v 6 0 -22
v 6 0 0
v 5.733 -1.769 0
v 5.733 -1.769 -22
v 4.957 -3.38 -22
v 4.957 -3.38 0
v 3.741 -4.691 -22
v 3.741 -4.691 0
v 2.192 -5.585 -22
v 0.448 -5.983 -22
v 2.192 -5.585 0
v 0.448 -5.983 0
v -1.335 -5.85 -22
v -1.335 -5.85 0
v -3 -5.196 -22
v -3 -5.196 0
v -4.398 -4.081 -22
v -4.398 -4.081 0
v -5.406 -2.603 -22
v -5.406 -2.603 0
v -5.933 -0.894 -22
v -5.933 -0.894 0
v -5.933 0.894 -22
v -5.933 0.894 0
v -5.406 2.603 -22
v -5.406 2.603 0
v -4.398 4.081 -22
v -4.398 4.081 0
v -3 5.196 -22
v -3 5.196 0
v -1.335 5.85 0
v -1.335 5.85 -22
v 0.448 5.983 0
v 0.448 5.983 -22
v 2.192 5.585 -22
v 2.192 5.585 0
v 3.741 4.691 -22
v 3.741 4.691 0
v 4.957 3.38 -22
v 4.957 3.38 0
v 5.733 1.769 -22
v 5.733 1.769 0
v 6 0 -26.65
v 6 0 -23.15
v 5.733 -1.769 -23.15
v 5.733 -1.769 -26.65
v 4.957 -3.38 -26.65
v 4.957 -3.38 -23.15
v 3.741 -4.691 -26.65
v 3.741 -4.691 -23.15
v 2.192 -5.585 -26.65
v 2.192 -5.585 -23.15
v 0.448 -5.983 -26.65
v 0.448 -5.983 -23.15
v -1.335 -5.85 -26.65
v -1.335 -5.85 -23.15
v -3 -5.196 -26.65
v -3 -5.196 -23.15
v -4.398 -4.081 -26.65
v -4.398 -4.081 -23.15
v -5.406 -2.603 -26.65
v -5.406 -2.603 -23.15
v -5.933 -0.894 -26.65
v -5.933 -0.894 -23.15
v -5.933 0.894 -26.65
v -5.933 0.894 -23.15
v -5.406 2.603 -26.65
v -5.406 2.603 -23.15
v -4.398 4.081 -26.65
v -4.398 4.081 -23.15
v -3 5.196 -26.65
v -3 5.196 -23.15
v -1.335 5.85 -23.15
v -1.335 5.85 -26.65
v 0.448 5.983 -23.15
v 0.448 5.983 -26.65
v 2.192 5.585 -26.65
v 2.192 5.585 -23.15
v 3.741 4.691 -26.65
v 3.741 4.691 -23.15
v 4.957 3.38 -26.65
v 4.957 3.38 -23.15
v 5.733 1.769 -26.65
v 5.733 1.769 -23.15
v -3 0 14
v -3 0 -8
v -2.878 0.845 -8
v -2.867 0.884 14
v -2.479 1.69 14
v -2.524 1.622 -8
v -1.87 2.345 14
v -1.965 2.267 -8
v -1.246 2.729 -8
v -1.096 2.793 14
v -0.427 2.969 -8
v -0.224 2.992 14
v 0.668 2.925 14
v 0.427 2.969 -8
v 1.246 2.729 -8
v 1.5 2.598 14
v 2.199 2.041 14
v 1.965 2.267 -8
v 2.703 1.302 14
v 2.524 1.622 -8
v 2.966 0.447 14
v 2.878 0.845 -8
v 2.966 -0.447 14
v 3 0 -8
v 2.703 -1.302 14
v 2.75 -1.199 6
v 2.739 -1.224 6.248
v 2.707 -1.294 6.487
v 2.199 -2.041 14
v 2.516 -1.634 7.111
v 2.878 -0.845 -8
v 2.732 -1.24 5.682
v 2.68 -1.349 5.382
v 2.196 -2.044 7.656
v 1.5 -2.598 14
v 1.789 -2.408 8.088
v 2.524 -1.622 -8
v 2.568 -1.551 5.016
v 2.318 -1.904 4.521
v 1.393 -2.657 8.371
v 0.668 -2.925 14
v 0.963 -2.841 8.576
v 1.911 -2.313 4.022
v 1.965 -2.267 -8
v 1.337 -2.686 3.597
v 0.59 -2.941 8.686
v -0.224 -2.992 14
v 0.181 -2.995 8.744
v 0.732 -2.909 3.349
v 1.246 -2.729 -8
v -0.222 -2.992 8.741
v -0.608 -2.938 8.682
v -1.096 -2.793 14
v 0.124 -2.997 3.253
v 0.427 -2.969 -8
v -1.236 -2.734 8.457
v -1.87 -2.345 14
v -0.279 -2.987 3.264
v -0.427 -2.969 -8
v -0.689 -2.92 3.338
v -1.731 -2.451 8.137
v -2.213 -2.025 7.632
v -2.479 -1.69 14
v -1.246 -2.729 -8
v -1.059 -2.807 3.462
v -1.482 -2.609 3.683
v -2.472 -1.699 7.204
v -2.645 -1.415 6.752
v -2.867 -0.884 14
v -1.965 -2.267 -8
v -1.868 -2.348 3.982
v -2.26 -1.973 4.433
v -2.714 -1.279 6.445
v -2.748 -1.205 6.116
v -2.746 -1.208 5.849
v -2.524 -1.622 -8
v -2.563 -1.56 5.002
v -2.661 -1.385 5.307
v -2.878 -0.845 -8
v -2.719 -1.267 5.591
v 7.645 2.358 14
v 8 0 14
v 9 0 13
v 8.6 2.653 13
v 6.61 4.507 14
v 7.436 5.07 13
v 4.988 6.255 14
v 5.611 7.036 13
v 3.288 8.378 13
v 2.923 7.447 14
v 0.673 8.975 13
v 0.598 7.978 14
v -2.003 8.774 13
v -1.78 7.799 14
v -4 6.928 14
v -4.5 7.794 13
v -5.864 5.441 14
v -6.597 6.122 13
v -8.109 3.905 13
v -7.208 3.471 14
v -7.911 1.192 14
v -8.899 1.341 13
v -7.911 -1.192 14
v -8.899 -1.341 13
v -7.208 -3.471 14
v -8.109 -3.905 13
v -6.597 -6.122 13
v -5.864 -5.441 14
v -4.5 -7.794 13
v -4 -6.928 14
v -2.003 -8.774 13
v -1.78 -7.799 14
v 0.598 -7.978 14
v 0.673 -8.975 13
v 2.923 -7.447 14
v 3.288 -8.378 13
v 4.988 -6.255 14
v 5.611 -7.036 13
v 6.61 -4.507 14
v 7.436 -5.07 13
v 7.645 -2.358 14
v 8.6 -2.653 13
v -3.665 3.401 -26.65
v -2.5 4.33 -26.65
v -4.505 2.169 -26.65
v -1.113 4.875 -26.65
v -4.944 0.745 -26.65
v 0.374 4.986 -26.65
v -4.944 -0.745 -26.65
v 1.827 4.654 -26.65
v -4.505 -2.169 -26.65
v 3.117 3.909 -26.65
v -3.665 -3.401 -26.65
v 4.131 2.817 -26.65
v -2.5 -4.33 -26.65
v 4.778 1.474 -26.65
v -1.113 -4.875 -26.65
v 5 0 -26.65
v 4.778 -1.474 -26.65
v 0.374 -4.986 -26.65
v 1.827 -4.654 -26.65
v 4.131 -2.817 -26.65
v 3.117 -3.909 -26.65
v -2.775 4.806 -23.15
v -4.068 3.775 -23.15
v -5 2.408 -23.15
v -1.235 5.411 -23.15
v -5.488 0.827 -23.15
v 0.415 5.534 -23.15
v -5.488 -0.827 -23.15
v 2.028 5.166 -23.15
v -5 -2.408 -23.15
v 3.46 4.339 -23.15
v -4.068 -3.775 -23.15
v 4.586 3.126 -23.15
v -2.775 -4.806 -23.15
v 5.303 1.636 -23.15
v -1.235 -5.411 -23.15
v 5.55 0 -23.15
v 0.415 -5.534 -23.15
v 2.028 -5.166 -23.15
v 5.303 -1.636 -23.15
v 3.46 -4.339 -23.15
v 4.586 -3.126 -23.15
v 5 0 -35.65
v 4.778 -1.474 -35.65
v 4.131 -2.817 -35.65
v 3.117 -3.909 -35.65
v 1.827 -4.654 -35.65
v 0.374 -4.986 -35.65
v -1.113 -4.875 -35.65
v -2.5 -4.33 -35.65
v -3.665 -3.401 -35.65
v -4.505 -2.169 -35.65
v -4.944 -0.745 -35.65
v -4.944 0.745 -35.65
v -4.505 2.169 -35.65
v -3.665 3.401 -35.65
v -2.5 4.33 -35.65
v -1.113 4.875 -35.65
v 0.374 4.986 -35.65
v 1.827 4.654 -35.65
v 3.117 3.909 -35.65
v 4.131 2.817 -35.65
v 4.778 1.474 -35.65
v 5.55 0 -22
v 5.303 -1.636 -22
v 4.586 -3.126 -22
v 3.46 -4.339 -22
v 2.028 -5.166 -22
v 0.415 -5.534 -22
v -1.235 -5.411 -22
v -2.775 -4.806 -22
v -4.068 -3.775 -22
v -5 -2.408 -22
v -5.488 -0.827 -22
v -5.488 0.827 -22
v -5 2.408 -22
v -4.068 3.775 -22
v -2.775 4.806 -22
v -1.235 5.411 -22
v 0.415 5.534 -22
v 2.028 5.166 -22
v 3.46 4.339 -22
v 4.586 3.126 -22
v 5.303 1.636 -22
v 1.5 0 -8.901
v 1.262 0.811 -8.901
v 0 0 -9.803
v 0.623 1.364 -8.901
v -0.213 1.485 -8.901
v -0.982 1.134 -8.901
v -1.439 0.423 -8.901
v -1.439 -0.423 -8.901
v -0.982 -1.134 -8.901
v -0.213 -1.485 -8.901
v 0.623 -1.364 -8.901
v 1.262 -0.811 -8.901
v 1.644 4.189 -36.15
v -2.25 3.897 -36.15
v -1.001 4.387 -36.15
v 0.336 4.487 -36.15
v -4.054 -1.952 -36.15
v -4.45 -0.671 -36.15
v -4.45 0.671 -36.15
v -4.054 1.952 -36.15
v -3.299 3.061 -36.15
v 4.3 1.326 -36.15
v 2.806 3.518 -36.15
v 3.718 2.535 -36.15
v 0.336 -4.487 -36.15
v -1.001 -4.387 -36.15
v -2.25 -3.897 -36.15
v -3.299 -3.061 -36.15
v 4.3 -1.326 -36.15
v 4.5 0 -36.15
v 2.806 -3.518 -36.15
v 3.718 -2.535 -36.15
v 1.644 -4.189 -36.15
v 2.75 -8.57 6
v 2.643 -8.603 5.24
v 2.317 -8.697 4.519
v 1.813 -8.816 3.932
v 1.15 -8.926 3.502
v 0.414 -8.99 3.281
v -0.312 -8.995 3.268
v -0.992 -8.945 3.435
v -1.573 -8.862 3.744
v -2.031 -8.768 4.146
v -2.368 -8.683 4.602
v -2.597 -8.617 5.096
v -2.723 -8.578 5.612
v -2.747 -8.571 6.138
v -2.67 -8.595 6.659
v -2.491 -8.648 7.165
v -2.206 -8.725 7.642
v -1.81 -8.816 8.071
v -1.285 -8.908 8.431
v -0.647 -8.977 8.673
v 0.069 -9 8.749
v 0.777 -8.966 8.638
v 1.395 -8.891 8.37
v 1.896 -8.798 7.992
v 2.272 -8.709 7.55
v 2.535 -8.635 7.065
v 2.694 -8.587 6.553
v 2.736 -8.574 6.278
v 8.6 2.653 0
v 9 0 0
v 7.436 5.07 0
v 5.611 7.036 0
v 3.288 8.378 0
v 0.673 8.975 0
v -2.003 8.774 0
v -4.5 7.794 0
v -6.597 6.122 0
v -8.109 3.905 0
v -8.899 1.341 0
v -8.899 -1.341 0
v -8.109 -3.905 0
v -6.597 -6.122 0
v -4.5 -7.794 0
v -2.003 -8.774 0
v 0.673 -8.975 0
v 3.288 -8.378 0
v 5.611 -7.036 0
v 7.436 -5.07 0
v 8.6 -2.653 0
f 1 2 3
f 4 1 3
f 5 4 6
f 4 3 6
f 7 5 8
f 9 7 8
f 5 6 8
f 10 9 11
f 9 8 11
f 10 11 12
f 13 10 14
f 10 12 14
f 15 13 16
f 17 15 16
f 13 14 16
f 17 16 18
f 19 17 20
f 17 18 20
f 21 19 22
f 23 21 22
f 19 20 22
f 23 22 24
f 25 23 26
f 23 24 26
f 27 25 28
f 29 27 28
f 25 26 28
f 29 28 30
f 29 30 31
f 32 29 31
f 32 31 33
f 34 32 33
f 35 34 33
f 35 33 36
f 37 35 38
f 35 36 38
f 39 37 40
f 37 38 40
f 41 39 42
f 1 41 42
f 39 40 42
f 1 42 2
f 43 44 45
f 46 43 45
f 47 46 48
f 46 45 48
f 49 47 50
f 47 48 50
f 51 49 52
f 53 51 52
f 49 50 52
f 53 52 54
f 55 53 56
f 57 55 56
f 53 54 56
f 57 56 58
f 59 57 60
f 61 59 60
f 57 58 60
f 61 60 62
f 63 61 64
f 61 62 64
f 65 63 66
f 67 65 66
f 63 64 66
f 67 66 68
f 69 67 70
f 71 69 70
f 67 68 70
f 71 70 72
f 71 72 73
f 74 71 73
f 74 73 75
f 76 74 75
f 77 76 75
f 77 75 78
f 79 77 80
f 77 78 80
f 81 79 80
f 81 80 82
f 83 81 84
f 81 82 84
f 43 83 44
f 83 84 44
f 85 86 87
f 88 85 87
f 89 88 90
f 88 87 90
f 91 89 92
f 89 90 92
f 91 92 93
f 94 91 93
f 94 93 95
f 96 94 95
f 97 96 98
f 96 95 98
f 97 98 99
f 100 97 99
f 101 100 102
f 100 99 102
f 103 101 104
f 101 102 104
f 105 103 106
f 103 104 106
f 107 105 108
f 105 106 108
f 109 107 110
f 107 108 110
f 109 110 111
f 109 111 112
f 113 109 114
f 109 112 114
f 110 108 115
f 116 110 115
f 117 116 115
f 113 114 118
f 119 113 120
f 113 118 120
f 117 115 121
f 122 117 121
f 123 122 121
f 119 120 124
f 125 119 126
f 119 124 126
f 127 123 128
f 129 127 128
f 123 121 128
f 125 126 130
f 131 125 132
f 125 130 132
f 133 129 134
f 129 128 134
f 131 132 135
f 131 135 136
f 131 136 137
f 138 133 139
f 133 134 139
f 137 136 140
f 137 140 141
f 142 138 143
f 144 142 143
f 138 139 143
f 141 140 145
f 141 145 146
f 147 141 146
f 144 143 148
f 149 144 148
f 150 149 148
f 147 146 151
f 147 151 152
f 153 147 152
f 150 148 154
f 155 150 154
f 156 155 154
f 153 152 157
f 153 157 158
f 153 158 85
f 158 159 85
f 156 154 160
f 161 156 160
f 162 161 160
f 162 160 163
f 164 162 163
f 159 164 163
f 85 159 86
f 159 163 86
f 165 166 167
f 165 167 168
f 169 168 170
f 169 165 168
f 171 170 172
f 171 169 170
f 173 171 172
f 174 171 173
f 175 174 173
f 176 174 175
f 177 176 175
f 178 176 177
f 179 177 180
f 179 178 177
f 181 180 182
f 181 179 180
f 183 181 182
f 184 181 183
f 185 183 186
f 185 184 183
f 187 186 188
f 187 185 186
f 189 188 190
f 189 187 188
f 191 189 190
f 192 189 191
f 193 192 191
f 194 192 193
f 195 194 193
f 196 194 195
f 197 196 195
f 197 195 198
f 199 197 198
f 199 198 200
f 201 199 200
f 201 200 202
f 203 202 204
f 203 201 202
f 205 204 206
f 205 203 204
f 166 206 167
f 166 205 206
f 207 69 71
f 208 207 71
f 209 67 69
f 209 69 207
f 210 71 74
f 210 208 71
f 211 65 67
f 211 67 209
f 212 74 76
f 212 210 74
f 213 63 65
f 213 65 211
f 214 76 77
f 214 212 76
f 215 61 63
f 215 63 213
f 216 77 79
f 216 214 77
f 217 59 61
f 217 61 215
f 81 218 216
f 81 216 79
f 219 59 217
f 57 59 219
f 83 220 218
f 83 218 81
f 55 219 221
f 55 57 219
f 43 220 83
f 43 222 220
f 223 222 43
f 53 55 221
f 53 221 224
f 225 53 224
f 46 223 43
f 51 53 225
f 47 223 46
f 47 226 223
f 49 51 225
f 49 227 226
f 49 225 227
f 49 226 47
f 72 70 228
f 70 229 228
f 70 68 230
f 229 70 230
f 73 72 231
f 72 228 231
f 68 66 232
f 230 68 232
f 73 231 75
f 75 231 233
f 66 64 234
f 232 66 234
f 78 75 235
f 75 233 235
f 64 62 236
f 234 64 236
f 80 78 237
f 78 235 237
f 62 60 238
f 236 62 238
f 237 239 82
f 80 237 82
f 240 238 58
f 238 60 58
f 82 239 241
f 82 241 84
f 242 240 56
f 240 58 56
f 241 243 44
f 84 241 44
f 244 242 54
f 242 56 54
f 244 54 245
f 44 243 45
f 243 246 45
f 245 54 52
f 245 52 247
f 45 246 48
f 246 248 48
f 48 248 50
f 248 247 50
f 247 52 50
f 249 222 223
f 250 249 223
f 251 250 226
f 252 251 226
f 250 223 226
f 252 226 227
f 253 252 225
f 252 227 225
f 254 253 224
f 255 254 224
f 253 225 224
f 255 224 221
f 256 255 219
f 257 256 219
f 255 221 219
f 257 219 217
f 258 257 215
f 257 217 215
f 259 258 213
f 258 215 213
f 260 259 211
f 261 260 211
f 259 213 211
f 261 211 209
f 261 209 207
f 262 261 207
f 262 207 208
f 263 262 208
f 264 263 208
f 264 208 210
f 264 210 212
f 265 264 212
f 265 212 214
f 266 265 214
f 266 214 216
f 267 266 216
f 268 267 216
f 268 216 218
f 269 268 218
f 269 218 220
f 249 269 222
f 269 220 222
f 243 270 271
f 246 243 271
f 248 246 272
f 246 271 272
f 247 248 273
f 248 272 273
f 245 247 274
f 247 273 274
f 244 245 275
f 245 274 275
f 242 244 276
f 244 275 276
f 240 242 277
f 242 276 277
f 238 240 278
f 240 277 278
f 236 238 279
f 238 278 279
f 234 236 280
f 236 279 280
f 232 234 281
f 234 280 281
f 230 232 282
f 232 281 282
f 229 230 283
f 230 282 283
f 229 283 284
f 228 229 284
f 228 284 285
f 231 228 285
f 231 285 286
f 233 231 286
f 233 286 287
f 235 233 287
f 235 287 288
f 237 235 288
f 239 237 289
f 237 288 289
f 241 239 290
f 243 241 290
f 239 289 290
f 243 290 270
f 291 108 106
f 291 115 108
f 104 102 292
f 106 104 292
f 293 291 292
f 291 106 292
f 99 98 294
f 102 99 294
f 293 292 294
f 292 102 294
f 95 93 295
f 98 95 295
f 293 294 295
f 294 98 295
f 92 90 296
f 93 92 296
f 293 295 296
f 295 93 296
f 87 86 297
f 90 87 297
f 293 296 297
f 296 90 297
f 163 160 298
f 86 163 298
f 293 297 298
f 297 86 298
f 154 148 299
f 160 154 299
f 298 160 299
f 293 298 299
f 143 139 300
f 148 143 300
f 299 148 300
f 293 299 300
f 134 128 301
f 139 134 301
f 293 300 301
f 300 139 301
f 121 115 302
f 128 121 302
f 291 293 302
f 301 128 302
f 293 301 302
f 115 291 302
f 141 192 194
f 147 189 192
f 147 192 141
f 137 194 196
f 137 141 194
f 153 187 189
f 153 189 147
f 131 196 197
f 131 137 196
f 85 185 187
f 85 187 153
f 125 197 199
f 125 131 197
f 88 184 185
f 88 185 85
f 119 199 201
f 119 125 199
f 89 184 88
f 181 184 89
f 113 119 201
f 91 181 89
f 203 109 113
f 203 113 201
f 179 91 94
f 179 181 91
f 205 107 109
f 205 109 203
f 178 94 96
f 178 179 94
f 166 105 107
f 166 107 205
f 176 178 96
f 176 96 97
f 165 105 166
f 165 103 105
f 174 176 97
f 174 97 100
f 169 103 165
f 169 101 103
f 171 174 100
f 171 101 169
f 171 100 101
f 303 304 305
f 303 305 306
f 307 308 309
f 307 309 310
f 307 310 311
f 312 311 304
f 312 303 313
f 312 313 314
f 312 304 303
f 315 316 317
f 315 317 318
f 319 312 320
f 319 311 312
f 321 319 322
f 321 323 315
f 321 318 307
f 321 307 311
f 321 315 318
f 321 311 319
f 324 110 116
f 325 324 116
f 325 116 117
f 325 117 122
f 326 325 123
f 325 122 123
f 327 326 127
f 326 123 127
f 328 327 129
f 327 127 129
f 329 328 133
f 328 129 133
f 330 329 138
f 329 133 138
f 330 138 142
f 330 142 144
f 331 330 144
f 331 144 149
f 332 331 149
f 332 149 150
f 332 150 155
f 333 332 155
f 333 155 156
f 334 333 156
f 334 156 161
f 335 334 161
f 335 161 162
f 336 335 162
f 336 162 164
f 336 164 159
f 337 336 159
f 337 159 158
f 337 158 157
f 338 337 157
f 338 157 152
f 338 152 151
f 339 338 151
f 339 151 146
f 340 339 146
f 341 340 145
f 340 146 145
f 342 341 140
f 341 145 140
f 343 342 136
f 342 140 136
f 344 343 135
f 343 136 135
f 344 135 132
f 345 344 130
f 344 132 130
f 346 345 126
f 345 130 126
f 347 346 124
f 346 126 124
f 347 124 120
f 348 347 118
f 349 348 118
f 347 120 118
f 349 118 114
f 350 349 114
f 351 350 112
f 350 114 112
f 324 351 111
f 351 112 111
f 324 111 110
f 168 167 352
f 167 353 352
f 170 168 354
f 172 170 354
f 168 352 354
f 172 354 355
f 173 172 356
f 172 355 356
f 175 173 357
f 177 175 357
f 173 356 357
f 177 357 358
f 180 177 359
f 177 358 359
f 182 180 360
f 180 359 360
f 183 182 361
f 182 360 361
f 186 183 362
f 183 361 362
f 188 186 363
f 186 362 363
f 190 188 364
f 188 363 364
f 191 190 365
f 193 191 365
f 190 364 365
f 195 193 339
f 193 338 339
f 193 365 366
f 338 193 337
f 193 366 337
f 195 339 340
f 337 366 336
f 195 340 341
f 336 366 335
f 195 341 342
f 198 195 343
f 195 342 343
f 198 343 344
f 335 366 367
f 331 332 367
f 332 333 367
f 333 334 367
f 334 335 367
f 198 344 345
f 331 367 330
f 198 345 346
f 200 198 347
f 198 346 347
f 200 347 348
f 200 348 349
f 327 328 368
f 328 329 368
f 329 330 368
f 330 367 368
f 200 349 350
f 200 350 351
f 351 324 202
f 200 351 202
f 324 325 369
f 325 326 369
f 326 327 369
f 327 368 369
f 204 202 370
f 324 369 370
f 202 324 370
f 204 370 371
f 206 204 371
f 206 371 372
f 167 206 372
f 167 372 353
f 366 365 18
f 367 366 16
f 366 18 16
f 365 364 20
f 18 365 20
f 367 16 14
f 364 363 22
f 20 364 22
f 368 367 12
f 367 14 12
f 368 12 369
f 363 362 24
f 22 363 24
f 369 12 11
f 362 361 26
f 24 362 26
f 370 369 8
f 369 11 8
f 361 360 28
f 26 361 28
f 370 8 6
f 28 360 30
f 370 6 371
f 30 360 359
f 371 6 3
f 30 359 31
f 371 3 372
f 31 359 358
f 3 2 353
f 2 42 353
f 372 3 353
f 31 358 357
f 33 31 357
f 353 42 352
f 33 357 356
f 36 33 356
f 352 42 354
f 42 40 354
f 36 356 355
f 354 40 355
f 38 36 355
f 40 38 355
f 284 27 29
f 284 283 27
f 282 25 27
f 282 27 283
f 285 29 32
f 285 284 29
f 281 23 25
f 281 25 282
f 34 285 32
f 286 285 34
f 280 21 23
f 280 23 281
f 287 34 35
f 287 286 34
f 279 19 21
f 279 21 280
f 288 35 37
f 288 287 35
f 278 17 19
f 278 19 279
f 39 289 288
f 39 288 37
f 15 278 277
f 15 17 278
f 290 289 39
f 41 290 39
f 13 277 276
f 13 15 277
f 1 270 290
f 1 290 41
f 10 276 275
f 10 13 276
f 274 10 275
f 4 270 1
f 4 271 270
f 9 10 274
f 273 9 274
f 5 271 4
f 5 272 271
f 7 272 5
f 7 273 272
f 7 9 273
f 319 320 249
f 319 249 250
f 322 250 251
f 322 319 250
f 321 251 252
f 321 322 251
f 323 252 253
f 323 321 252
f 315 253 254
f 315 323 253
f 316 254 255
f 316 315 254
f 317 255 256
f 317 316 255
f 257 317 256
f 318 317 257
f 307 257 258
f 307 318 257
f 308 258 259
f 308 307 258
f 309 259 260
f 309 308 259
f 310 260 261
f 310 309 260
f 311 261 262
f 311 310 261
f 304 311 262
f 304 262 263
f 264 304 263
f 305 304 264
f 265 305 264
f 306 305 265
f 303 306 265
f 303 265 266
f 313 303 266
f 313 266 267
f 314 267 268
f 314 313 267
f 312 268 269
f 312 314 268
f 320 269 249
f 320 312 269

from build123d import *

# Parameters (mm, degrees)
F0_R      = 9
F1_DEPTH  = 14
F2_R      = 6
F3_DEPTH  = 22
F4_R      = 5.55
F5_DEPTH  = 1.15
F6_R      = 6
F7_DEPTH  = 3.5
F8_R      = 5
F9_DEPTH  = 9.5
F10_SIZE  = 0.5
F11_SIZE  = 1
F13_D     = 6
F13_DEPTH = 22
F13_TIP   = 1.8025818571
F15_D     = 5.5
F15_DEPTH = 22
F15_TIP   = 1.6523667023


with BuildPart() as f1:
    # F0 (on Top) → F1 (new body)
    with BuildSketch(Plane.XY):
        Circle(F0_R)
    extrude(amount=F1_DEPTH)

    # F2 (on face) → F3 (join)
    with BuildSketch(Plane(origin=(0, 0, 0), x_dir=(1, 0, 0), z_dir=(0, 0, -1))):
        Circle(F2_R)
    extrude(amount=F3_DEPTH)

    # F4 (on face) → F5 (join)
    with BuildSketch(Plane(origin=(0, 0, -22), x_dir=(1, 0, 0), z_dir=(0, 0, -1))):
        Circle(F4_R)
    extrude(amount=F5_DEPTH)

    # F6 (on face) → F7 (join)
    with BuildSketch(Plane(origin=(0, 0, -23.15), x_dir=(1, 0, 0), z_dir=(0, 0, -1))):
        Circle(F6_R)
    extrude(amount=F7_DEPTH)

    # F8 (on face) → F9 (join)
    with BuildSketch(Plane(origin=(0, 0, -26.65), x_dir=(1, 0, 0), z_dir=(0, 0, -1))):
        Circle(F8_R)
    extrude(amount=F9_DEPTH)

    # F10
    f10_edges = [f1.edges().sort_by_distance(p)[0] for p in [
        (-5, 0, -36.15),
    ]]
    chamfer(f10_edges, length=F10_SIZE)

    # F11
    f11_edges = [f1.edges().sort_by_distance(p)[0] for p in [
        (-9, 0, 14),
    ]]
    chamfer(f11_edges, length=F11_SIZE)

    # F13
    with Locations(Plane.XY.offset(14)):
        with Locations((0, 0)):
            Hole(F13_D / 2, depth=F13_DEPTH)
            with Locations((0, 0, -(F13_DEPTH + F13_TIP / 2))):  # 118° drill point
                Cone(0, F13_D / 2, F13_TIP, mode=Mode.SUBTRACT)

    # F15 (one way)
    with BuildSketch(Plane(origin=(0, 0, 0), x_dir=(1, 0, 0), z_dir=(0, 1, 0))):
        with Locations((0, -6)):
            Circle(F15_D / 2)
    extrude(amount=-F15_DEPTH, mode=Mode.SUBTRACT)
    with Locations(Plane(origin=(0, 0, 0), x_dir=(1, 0, 0), z_dir=(0, 1, 0))):
        with Locations((0, -6)):
            with Locations((0, 0, -(F15_DEPTH + F15_TIP / 2))):  # 118° drill point
                Cone(0, F15_D / 2, F15_TIP, mode=Mode.SUBTRACT)


solid = f1.part
